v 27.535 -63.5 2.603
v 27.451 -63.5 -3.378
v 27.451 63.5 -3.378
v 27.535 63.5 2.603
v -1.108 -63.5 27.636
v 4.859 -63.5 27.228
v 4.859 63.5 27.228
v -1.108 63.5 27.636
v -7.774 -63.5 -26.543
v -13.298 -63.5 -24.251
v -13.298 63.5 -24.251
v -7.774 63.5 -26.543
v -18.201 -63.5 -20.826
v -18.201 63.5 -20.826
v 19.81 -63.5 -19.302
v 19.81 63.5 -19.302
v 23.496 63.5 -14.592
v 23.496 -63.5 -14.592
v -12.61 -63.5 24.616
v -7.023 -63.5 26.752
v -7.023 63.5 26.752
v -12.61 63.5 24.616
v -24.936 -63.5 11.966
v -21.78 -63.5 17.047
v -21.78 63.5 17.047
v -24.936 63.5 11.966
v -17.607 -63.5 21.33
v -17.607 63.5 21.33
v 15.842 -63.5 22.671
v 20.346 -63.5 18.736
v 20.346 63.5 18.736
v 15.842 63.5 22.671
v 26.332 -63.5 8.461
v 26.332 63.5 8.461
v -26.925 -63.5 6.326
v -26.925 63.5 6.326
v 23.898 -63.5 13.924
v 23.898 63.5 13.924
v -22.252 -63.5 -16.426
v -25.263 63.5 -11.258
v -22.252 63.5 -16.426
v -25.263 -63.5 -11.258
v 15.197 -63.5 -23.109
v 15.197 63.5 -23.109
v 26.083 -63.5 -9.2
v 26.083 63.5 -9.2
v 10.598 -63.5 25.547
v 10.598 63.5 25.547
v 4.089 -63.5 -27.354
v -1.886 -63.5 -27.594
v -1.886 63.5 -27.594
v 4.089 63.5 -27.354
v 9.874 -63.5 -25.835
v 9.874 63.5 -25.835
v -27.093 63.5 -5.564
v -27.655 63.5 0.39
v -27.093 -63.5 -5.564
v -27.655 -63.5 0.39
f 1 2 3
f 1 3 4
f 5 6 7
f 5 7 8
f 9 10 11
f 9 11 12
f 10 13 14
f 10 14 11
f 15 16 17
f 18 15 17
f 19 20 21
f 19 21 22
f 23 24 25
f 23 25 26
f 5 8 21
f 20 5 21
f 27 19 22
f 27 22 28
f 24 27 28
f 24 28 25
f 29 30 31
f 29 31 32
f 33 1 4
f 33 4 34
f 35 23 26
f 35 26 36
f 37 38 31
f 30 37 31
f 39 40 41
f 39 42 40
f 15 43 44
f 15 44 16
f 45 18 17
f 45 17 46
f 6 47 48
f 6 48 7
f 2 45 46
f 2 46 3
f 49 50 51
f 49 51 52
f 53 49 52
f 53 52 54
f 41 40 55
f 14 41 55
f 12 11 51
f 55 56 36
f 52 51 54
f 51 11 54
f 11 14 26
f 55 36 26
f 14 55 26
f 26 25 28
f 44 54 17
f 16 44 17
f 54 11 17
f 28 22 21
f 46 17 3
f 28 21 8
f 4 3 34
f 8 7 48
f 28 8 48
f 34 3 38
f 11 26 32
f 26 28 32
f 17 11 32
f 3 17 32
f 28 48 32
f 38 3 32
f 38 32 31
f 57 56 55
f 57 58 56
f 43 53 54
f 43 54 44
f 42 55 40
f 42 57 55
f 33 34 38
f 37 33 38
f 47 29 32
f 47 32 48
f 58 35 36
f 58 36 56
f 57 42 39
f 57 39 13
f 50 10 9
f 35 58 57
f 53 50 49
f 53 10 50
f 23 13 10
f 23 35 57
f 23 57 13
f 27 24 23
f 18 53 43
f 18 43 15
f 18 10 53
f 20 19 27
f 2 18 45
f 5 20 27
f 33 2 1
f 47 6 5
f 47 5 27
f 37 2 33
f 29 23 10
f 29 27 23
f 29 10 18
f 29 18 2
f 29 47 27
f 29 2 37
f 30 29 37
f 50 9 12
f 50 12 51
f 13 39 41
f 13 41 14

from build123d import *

# Parameters (mm, degrees)
F1_DEPTH = 63.5


with BuildPart() as f1:
    # F0 (on Front) → F1 (new body, symmetric)
    with BuildSketch(Plane.XZ):
        Polygon((-25.263004, -11.258429), (-22.252139, -16.426012), (-18.200789, -20.825533), (-13.298391, -24.251275), (-7.774175, -26.543055), (-1.886447, -27.593711), (4.08949, -27.354116), (9.874206, -25.835472), (15.197215, -23.108791), (19.80962, -19.301568), (23.495748, -14.591825), (26.083242, -9.199785), (27.451112, -3.377573), (27.535399, 2.60257), (26.332161, 8.46102), (23.89766, 13.923843), (20.345732, 18.735601), (15.842459, 22.671304), (10.598411, 25.546922), (4.858793, 27.227995), (-1.108017, 27.635916), (-7.023017, 26.751613), (-12.609629, 24.616434), (-17.606628, 21.330218), (-21.780362, 17.046625), (-24.935669, 11.96595), (-26.925013, 6.325761), (-27.655373, 0.389787), (-27.092598, -5.564414), align=None)
    extrude(amount=F1_DEPTH, both=True)


solid = f1.part
